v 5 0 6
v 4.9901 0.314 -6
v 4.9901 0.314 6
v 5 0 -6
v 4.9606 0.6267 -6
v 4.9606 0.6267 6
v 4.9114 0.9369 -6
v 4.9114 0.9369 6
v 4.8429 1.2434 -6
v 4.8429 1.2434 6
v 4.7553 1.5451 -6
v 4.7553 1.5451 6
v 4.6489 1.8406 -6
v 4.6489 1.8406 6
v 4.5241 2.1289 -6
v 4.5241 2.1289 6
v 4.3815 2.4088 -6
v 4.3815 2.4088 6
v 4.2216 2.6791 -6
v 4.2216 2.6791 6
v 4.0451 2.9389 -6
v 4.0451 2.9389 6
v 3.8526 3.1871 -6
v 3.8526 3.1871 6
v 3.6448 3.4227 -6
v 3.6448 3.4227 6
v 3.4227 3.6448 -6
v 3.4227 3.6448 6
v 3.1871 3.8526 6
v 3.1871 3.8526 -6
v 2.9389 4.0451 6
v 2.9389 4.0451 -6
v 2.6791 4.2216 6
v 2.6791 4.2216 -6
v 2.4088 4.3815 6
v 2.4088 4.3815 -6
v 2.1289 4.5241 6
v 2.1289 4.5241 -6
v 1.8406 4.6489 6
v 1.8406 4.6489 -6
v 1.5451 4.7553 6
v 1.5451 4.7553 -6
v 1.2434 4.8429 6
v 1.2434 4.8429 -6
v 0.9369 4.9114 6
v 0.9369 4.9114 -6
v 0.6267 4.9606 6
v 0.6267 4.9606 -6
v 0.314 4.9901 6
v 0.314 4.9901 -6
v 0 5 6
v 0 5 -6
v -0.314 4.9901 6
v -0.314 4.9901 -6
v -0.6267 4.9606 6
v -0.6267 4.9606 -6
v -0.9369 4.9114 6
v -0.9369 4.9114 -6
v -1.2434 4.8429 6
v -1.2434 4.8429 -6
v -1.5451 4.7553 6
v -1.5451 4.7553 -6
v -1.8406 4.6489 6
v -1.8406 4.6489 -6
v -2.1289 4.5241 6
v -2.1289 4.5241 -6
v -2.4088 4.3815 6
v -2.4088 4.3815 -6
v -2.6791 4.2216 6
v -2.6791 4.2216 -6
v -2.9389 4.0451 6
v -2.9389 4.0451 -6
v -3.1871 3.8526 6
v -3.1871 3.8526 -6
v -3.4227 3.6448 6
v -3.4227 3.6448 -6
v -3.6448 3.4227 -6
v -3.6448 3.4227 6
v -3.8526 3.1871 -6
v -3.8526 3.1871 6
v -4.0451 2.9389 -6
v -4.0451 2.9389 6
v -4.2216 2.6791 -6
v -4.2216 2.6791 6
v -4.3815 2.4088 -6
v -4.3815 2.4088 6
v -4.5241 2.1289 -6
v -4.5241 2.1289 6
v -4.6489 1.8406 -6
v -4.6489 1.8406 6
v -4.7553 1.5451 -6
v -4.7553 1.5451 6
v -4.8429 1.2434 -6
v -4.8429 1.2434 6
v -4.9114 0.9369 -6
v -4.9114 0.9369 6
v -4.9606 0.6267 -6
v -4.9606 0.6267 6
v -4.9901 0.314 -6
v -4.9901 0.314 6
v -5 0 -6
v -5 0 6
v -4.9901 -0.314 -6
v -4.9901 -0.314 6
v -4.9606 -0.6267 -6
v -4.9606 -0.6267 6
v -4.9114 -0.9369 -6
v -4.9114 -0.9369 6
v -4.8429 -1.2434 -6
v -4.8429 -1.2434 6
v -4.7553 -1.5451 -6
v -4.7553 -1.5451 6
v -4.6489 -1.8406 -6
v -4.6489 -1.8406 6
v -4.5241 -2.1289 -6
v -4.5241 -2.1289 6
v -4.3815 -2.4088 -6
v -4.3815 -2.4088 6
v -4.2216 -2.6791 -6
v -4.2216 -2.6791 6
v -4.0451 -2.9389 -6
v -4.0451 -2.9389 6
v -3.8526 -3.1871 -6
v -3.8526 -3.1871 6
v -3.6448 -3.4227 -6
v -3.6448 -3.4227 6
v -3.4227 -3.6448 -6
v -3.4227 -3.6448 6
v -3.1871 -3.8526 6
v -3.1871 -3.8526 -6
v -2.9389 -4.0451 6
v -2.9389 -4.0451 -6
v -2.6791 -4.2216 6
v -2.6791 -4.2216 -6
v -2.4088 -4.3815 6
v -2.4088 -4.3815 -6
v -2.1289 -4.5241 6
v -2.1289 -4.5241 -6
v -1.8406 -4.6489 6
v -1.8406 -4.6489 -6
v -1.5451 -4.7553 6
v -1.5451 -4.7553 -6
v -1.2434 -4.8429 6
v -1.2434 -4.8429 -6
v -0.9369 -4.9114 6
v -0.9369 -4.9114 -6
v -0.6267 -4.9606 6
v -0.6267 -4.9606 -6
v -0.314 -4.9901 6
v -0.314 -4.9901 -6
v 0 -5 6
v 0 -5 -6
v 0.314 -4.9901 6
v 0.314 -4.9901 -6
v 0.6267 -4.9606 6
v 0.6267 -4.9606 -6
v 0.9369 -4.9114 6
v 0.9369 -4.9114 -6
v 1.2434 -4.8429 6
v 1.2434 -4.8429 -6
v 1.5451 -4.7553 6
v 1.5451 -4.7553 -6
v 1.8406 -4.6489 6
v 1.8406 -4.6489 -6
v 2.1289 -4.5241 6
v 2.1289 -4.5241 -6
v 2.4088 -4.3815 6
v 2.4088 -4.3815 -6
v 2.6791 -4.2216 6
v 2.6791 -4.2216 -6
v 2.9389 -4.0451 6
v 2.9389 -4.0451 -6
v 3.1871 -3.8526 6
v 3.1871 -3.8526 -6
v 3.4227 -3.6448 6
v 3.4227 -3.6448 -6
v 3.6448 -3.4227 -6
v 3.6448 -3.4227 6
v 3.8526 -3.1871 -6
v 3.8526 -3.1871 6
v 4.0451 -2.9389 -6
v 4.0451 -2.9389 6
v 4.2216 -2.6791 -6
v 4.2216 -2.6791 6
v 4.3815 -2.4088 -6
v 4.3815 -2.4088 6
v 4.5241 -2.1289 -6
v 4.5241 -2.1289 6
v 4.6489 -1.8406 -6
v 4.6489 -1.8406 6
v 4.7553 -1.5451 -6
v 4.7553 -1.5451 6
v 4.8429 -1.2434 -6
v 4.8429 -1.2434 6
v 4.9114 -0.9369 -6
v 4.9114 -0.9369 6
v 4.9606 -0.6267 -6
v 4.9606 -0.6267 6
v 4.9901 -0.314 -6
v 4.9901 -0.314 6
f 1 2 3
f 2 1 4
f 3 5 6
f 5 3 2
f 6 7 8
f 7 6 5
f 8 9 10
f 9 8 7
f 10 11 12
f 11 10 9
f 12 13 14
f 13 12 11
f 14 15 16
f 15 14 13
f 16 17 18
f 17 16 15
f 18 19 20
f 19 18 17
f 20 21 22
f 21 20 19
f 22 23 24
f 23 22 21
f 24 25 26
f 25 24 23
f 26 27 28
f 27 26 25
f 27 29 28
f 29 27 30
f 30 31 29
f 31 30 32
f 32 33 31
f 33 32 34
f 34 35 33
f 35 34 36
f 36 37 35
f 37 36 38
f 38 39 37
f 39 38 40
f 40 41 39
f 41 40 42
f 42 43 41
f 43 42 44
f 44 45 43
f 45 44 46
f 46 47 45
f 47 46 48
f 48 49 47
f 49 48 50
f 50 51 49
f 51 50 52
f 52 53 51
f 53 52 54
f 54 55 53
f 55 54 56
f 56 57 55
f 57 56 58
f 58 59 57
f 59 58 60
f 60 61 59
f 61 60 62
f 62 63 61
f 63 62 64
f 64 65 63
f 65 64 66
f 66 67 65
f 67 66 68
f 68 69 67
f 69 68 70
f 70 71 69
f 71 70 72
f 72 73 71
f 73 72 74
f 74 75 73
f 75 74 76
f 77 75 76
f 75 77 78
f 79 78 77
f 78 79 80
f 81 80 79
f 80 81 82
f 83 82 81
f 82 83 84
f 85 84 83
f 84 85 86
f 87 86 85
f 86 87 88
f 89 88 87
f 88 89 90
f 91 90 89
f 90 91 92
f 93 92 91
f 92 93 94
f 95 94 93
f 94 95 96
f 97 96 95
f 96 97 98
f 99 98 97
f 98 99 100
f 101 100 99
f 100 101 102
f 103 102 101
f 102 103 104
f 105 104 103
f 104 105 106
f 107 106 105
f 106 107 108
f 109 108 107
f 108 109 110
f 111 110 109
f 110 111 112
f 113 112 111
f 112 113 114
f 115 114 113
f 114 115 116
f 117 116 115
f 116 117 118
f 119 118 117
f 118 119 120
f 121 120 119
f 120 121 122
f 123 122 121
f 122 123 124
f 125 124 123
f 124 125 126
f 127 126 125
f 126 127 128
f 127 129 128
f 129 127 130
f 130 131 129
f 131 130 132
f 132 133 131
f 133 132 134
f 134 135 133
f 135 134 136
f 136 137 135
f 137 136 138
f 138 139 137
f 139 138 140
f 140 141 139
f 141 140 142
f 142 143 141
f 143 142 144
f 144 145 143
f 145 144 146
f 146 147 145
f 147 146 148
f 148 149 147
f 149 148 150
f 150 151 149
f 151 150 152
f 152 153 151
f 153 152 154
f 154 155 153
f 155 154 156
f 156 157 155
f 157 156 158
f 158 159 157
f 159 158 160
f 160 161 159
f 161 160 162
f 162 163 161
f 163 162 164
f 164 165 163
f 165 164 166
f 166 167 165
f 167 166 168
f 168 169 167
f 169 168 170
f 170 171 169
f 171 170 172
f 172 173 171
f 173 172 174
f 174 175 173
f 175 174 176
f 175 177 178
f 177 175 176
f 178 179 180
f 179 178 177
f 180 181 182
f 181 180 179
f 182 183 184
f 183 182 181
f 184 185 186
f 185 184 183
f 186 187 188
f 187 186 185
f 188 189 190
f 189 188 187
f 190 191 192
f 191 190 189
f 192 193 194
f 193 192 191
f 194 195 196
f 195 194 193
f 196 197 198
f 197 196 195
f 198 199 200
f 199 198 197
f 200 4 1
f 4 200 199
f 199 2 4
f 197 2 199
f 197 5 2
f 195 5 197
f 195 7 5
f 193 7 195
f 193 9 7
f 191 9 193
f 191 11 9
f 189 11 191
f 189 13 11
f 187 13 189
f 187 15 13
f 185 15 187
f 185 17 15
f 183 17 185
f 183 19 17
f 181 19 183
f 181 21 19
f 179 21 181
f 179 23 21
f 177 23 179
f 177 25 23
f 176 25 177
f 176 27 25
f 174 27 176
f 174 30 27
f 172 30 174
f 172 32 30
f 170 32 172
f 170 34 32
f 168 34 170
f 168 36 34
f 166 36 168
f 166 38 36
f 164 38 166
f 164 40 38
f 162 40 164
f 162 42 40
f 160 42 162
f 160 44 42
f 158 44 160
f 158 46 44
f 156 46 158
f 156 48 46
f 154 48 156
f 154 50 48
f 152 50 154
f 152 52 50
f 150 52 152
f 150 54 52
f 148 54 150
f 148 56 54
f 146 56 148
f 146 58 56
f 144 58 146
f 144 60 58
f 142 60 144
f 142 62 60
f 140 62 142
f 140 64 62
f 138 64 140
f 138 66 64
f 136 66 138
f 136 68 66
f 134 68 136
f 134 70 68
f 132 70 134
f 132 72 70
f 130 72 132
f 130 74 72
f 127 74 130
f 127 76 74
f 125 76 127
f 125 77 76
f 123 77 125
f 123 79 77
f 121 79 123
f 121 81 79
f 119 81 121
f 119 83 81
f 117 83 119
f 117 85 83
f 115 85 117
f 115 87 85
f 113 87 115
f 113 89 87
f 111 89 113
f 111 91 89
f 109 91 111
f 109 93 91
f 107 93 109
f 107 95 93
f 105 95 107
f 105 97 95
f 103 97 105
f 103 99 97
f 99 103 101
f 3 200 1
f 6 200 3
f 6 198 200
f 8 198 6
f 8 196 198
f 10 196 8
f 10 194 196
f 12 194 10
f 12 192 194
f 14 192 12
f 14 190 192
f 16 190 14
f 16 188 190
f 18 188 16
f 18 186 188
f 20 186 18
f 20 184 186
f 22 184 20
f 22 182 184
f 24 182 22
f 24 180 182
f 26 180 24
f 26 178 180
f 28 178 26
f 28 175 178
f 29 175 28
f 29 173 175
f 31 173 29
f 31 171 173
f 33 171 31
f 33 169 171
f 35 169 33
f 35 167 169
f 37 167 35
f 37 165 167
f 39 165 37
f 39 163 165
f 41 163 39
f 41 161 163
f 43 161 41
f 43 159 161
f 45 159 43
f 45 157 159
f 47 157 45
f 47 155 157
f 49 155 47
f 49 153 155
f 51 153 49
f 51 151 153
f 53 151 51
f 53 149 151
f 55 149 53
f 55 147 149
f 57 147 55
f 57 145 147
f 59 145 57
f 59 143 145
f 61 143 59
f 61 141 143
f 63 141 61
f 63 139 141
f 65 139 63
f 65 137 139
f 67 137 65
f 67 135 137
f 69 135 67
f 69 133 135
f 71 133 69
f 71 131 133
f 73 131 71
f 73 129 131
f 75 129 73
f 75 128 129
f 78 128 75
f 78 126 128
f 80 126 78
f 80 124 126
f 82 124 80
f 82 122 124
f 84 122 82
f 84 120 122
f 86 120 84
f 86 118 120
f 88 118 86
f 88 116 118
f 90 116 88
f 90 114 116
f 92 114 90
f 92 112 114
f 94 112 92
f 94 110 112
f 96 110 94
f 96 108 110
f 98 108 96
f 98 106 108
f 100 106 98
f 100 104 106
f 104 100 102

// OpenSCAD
BEARING_SIZE = 10;

cylinder(d=BEARING_SIZE,h=12,$fn=100, center=true);
